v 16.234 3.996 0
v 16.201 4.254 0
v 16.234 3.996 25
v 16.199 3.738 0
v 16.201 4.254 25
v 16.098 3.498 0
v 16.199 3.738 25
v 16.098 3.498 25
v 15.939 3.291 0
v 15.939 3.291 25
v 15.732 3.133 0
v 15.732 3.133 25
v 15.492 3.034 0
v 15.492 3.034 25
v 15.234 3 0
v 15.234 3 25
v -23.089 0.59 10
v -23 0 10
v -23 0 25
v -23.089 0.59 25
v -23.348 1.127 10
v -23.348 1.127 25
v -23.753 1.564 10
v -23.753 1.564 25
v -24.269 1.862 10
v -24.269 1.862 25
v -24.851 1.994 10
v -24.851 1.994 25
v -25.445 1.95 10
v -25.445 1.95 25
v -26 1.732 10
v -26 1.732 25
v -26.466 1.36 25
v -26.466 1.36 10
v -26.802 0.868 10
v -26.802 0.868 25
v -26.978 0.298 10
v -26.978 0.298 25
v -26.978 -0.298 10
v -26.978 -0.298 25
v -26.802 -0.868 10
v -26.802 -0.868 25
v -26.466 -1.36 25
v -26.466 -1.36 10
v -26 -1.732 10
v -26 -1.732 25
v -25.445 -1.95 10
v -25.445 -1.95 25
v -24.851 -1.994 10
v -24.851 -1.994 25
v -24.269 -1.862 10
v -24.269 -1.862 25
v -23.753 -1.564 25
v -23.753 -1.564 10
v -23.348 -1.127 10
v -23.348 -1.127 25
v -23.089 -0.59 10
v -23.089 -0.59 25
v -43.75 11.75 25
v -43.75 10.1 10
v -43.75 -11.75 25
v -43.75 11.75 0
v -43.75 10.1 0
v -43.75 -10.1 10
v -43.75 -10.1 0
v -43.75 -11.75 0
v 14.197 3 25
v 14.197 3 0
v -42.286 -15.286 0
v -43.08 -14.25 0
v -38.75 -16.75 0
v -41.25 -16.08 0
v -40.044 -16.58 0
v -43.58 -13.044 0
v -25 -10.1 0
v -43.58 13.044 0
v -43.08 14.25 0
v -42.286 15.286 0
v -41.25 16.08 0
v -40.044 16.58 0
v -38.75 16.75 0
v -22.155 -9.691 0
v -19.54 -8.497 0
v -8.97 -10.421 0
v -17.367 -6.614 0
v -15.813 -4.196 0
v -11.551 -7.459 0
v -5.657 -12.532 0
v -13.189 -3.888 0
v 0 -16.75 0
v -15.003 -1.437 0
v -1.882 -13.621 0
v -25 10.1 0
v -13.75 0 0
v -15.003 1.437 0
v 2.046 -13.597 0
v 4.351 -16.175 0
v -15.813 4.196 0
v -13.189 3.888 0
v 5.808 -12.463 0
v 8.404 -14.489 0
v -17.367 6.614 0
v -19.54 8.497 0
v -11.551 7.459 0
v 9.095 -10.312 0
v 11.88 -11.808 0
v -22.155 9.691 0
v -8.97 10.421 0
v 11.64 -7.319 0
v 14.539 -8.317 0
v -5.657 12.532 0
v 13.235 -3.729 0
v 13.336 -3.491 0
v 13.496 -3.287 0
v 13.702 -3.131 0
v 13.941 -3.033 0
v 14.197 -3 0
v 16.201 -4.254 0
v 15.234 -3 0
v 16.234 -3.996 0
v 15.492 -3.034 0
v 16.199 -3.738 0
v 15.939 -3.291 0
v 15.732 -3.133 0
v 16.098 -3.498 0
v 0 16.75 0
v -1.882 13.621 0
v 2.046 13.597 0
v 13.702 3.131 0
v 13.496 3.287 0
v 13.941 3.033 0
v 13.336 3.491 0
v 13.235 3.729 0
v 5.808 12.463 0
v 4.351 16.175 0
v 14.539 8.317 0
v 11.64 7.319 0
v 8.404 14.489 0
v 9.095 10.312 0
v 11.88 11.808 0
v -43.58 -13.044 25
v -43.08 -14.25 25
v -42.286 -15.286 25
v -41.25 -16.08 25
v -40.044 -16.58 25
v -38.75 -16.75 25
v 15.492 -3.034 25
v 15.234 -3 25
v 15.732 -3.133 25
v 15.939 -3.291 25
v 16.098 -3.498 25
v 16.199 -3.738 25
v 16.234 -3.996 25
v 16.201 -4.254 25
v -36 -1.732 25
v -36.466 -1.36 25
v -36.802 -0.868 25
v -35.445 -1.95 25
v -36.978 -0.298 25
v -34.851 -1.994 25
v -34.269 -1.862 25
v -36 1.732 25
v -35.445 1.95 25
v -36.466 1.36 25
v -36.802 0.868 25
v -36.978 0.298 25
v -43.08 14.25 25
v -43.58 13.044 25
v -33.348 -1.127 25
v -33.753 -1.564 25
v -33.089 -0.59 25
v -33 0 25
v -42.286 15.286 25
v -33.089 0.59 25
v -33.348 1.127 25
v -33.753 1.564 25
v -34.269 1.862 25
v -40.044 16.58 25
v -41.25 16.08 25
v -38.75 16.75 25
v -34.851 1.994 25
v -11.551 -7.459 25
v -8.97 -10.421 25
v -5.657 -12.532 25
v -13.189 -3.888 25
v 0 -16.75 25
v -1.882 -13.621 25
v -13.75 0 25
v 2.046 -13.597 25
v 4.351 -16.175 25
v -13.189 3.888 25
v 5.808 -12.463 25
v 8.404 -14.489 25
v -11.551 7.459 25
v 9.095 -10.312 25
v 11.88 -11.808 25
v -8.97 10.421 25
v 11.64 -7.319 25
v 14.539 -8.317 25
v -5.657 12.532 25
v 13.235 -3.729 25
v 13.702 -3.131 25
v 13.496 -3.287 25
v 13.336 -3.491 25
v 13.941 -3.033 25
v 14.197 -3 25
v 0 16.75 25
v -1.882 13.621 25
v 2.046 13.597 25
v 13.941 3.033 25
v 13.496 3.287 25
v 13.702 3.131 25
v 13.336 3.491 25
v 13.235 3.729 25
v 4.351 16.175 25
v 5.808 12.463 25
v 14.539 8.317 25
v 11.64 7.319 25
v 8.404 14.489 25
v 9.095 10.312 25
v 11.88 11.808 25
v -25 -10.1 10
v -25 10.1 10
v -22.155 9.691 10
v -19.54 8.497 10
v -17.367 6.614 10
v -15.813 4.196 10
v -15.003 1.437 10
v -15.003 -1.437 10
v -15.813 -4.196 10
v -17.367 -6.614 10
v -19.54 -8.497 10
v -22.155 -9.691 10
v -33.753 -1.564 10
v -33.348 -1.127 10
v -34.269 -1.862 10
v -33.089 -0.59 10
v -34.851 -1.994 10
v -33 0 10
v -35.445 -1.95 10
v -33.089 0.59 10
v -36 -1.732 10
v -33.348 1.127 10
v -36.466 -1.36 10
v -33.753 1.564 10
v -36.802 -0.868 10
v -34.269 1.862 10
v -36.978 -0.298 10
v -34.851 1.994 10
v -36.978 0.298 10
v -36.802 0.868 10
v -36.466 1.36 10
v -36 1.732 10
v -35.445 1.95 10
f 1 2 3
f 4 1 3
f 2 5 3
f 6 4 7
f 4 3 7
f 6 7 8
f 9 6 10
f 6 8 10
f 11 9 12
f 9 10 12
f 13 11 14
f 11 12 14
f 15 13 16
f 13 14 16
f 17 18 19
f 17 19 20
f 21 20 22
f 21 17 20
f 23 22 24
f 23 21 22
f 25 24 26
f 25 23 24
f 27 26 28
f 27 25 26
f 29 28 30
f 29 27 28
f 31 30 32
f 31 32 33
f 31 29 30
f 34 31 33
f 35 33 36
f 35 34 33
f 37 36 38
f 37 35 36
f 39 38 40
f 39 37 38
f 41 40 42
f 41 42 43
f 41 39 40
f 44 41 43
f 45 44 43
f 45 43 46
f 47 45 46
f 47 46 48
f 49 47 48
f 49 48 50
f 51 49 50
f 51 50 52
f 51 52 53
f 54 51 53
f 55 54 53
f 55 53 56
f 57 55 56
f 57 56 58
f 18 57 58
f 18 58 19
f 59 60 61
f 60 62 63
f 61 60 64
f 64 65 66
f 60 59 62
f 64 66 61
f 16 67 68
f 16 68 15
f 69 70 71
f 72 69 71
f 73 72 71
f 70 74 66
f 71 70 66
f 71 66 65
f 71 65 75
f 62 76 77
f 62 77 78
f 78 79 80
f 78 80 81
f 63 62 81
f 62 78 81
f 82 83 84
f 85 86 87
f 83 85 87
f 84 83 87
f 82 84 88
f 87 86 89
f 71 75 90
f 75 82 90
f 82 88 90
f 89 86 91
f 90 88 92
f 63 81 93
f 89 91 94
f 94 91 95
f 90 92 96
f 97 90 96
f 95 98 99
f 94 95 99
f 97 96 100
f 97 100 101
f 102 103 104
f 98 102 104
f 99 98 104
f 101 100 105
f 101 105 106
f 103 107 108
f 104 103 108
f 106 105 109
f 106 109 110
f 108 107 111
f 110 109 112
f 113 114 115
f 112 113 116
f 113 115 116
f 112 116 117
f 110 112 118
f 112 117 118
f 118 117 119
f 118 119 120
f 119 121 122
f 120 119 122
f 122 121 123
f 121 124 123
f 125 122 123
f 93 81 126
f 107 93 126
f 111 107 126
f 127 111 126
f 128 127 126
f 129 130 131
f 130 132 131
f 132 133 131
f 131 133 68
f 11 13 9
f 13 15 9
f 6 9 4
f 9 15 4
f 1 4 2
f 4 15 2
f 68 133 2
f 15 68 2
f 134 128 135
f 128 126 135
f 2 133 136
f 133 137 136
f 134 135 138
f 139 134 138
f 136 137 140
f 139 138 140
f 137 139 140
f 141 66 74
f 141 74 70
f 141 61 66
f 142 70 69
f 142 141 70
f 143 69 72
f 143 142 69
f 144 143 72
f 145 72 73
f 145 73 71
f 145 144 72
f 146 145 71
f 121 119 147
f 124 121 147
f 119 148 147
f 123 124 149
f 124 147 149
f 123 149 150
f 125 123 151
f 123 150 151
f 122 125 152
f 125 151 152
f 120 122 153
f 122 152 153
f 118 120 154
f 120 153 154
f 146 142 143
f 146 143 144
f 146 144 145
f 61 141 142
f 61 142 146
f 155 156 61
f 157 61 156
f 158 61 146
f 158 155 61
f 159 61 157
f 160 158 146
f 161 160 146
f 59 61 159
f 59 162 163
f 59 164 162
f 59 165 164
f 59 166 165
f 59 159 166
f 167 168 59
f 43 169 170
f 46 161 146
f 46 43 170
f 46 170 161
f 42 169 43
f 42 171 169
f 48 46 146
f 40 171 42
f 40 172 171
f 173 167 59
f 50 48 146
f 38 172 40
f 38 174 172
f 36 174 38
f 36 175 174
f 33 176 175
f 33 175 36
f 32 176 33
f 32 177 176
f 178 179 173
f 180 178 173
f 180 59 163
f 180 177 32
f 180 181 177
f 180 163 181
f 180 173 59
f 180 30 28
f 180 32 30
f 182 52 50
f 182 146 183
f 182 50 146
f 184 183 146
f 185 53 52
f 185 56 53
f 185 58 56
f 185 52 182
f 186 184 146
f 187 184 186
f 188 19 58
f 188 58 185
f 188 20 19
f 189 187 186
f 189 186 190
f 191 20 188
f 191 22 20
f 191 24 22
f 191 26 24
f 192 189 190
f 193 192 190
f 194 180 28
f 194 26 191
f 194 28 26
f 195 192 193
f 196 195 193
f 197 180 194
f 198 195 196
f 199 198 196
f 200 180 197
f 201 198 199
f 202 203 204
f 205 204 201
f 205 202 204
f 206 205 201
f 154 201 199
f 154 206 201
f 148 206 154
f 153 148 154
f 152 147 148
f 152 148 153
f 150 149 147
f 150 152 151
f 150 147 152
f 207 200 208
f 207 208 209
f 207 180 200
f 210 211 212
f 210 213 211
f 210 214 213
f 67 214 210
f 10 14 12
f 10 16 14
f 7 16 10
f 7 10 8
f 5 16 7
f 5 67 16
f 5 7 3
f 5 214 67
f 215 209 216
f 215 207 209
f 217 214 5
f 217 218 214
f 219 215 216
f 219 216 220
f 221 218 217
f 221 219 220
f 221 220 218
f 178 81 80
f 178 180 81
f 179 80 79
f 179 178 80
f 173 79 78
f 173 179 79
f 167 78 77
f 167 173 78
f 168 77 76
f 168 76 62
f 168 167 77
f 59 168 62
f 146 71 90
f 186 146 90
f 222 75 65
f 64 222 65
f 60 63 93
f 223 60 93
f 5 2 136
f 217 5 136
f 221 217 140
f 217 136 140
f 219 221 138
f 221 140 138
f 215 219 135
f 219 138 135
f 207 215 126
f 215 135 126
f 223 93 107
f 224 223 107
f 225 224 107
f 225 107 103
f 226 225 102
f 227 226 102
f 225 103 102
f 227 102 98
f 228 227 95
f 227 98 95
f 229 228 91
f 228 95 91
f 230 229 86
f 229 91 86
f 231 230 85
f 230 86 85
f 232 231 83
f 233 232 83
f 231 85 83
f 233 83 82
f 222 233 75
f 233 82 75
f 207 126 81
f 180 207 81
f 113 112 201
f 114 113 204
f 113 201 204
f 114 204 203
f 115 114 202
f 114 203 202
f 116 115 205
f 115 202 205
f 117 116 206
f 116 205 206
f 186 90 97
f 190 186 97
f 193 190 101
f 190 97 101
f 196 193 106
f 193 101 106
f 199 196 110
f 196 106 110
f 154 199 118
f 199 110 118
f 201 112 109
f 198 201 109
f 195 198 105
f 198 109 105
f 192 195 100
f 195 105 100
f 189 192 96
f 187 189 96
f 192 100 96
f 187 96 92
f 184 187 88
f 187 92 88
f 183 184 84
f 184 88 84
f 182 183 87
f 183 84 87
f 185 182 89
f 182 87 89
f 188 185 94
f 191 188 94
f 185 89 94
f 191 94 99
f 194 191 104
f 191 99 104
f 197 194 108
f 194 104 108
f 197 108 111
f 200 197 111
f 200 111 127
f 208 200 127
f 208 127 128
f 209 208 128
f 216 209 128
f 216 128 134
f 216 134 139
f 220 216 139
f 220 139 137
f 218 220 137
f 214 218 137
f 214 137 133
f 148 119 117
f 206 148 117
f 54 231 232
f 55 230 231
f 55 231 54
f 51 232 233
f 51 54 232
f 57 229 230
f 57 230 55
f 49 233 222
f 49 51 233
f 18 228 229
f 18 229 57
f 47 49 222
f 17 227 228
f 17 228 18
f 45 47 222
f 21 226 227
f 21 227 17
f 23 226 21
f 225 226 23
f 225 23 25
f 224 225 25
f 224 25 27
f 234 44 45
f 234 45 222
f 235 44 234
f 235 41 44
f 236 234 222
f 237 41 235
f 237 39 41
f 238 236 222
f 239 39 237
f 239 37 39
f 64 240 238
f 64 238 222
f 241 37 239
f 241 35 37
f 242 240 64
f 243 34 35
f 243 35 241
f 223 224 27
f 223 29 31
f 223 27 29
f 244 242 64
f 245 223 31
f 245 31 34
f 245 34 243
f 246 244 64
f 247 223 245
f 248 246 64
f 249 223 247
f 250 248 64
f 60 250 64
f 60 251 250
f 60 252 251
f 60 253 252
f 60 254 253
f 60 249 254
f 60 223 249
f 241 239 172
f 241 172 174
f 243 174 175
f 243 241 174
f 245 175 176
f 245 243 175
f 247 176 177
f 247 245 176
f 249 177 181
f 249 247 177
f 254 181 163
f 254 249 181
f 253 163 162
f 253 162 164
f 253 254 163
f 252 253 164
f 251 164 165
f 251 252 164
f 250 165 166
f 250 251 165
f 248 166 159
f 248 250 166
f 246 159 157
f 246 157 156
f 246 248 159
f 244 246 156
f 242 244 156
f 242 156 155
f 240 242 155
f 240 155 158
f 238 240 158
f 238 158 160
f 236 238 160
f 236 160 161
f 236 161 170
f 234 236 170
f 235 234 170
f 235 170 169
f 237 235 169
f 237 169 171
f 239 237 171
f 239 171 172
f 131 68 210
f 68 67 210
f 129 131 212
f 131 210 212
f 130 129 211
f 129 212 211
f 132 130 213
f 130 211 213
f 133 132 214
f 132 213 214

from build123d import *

# Parameters (mm, degrees)
ESQUISSE1_R             = 2
BOSS_EXTRU_1_DEPTH      = 25
CONG_1_R                = 5
CONG_2_R                = 1
ENL_V_MAT_EXTRU_1_DEPTH = 10


with BuildPart() as part:
    # Esquisse1 → Boss.-Extru.1 (new body)
    with BuildSketch(Plane.XY):
        with BuildLine():
            Line((13.4187369, 3), (16.479153498, 3))
            ThreePointArc((16.479153498, 3), (10.731088016, 12.861036117), (0, 16.75))
            Line((0, 16.75), (-43.75, 16.75))
            Line((-43.75, 16.75), (-43.75, -16.75))
            Line((-43.75, -16.75), (0, -16.75))
            ThreePointArc((0, -16.75), (10.731088016, -12.861036117), (16.479153498, -3))
            Line((16.479153498, -3), (13.4187369, -3))
            ThreePointArc((13.4187369, -3), (-13.75, 0), (13.4187369, 3))
        make_face()
        with Locations((-35, 0)):
            Circle(ESQUISSE1_R, mode=Mode.SUBTRACT)
        with Locations((-25, 0)):
            Circle(ESQUISSE1_R, mode=Mode.SUBTRACT)
    extrude(amount=BOSS_EXTRU_1_DEPTH)

    # Congé1
    cong_1_edges = [part.edges().sort_by_distance(p)[0] for p in [
        (-43.75, -16.75, 12.5),
        (-43.75, 16.75, 12.5),
    ]]
    fillet(cong_1_edges, radius=CONG_1_R)

    # Congé2
    cong_2_edges = [part.edges().sort_by_distance(p)[0] for p in [
        (13.4187369, -3, 12.5),
        (16.479153498, -3, 12.5),
        (16.479153498, 3, 12.5),
        (13.4187369, 3, 12.5),
    ]]
    fillet(cong_2_edges, radius=CONG_2_R)

    # Esquisse2 → Enlèv. mat.-Extru.1 (cut)
    with BuildSketch(Plane(origin=(0, 0, 0), x_dir=(-1, 0, 0), z_dir=(0, 0, -1))):
        with BuildLine():
            Line((43.75, 10.1), (25, 10.1))
            ThreePointArc((25, 10.1), (14.9, 0), (25, -10.1))
            Line((25, -10.1), (43.75, -10.1))
            Line((43.75, -10.1), (43.75, 10.1))
        make_face()
    extrude(amount=-ENL_V_MAT_EXTRU_1_DEPTH, mode=Mode.SUBTRACT)


solid = part.part
